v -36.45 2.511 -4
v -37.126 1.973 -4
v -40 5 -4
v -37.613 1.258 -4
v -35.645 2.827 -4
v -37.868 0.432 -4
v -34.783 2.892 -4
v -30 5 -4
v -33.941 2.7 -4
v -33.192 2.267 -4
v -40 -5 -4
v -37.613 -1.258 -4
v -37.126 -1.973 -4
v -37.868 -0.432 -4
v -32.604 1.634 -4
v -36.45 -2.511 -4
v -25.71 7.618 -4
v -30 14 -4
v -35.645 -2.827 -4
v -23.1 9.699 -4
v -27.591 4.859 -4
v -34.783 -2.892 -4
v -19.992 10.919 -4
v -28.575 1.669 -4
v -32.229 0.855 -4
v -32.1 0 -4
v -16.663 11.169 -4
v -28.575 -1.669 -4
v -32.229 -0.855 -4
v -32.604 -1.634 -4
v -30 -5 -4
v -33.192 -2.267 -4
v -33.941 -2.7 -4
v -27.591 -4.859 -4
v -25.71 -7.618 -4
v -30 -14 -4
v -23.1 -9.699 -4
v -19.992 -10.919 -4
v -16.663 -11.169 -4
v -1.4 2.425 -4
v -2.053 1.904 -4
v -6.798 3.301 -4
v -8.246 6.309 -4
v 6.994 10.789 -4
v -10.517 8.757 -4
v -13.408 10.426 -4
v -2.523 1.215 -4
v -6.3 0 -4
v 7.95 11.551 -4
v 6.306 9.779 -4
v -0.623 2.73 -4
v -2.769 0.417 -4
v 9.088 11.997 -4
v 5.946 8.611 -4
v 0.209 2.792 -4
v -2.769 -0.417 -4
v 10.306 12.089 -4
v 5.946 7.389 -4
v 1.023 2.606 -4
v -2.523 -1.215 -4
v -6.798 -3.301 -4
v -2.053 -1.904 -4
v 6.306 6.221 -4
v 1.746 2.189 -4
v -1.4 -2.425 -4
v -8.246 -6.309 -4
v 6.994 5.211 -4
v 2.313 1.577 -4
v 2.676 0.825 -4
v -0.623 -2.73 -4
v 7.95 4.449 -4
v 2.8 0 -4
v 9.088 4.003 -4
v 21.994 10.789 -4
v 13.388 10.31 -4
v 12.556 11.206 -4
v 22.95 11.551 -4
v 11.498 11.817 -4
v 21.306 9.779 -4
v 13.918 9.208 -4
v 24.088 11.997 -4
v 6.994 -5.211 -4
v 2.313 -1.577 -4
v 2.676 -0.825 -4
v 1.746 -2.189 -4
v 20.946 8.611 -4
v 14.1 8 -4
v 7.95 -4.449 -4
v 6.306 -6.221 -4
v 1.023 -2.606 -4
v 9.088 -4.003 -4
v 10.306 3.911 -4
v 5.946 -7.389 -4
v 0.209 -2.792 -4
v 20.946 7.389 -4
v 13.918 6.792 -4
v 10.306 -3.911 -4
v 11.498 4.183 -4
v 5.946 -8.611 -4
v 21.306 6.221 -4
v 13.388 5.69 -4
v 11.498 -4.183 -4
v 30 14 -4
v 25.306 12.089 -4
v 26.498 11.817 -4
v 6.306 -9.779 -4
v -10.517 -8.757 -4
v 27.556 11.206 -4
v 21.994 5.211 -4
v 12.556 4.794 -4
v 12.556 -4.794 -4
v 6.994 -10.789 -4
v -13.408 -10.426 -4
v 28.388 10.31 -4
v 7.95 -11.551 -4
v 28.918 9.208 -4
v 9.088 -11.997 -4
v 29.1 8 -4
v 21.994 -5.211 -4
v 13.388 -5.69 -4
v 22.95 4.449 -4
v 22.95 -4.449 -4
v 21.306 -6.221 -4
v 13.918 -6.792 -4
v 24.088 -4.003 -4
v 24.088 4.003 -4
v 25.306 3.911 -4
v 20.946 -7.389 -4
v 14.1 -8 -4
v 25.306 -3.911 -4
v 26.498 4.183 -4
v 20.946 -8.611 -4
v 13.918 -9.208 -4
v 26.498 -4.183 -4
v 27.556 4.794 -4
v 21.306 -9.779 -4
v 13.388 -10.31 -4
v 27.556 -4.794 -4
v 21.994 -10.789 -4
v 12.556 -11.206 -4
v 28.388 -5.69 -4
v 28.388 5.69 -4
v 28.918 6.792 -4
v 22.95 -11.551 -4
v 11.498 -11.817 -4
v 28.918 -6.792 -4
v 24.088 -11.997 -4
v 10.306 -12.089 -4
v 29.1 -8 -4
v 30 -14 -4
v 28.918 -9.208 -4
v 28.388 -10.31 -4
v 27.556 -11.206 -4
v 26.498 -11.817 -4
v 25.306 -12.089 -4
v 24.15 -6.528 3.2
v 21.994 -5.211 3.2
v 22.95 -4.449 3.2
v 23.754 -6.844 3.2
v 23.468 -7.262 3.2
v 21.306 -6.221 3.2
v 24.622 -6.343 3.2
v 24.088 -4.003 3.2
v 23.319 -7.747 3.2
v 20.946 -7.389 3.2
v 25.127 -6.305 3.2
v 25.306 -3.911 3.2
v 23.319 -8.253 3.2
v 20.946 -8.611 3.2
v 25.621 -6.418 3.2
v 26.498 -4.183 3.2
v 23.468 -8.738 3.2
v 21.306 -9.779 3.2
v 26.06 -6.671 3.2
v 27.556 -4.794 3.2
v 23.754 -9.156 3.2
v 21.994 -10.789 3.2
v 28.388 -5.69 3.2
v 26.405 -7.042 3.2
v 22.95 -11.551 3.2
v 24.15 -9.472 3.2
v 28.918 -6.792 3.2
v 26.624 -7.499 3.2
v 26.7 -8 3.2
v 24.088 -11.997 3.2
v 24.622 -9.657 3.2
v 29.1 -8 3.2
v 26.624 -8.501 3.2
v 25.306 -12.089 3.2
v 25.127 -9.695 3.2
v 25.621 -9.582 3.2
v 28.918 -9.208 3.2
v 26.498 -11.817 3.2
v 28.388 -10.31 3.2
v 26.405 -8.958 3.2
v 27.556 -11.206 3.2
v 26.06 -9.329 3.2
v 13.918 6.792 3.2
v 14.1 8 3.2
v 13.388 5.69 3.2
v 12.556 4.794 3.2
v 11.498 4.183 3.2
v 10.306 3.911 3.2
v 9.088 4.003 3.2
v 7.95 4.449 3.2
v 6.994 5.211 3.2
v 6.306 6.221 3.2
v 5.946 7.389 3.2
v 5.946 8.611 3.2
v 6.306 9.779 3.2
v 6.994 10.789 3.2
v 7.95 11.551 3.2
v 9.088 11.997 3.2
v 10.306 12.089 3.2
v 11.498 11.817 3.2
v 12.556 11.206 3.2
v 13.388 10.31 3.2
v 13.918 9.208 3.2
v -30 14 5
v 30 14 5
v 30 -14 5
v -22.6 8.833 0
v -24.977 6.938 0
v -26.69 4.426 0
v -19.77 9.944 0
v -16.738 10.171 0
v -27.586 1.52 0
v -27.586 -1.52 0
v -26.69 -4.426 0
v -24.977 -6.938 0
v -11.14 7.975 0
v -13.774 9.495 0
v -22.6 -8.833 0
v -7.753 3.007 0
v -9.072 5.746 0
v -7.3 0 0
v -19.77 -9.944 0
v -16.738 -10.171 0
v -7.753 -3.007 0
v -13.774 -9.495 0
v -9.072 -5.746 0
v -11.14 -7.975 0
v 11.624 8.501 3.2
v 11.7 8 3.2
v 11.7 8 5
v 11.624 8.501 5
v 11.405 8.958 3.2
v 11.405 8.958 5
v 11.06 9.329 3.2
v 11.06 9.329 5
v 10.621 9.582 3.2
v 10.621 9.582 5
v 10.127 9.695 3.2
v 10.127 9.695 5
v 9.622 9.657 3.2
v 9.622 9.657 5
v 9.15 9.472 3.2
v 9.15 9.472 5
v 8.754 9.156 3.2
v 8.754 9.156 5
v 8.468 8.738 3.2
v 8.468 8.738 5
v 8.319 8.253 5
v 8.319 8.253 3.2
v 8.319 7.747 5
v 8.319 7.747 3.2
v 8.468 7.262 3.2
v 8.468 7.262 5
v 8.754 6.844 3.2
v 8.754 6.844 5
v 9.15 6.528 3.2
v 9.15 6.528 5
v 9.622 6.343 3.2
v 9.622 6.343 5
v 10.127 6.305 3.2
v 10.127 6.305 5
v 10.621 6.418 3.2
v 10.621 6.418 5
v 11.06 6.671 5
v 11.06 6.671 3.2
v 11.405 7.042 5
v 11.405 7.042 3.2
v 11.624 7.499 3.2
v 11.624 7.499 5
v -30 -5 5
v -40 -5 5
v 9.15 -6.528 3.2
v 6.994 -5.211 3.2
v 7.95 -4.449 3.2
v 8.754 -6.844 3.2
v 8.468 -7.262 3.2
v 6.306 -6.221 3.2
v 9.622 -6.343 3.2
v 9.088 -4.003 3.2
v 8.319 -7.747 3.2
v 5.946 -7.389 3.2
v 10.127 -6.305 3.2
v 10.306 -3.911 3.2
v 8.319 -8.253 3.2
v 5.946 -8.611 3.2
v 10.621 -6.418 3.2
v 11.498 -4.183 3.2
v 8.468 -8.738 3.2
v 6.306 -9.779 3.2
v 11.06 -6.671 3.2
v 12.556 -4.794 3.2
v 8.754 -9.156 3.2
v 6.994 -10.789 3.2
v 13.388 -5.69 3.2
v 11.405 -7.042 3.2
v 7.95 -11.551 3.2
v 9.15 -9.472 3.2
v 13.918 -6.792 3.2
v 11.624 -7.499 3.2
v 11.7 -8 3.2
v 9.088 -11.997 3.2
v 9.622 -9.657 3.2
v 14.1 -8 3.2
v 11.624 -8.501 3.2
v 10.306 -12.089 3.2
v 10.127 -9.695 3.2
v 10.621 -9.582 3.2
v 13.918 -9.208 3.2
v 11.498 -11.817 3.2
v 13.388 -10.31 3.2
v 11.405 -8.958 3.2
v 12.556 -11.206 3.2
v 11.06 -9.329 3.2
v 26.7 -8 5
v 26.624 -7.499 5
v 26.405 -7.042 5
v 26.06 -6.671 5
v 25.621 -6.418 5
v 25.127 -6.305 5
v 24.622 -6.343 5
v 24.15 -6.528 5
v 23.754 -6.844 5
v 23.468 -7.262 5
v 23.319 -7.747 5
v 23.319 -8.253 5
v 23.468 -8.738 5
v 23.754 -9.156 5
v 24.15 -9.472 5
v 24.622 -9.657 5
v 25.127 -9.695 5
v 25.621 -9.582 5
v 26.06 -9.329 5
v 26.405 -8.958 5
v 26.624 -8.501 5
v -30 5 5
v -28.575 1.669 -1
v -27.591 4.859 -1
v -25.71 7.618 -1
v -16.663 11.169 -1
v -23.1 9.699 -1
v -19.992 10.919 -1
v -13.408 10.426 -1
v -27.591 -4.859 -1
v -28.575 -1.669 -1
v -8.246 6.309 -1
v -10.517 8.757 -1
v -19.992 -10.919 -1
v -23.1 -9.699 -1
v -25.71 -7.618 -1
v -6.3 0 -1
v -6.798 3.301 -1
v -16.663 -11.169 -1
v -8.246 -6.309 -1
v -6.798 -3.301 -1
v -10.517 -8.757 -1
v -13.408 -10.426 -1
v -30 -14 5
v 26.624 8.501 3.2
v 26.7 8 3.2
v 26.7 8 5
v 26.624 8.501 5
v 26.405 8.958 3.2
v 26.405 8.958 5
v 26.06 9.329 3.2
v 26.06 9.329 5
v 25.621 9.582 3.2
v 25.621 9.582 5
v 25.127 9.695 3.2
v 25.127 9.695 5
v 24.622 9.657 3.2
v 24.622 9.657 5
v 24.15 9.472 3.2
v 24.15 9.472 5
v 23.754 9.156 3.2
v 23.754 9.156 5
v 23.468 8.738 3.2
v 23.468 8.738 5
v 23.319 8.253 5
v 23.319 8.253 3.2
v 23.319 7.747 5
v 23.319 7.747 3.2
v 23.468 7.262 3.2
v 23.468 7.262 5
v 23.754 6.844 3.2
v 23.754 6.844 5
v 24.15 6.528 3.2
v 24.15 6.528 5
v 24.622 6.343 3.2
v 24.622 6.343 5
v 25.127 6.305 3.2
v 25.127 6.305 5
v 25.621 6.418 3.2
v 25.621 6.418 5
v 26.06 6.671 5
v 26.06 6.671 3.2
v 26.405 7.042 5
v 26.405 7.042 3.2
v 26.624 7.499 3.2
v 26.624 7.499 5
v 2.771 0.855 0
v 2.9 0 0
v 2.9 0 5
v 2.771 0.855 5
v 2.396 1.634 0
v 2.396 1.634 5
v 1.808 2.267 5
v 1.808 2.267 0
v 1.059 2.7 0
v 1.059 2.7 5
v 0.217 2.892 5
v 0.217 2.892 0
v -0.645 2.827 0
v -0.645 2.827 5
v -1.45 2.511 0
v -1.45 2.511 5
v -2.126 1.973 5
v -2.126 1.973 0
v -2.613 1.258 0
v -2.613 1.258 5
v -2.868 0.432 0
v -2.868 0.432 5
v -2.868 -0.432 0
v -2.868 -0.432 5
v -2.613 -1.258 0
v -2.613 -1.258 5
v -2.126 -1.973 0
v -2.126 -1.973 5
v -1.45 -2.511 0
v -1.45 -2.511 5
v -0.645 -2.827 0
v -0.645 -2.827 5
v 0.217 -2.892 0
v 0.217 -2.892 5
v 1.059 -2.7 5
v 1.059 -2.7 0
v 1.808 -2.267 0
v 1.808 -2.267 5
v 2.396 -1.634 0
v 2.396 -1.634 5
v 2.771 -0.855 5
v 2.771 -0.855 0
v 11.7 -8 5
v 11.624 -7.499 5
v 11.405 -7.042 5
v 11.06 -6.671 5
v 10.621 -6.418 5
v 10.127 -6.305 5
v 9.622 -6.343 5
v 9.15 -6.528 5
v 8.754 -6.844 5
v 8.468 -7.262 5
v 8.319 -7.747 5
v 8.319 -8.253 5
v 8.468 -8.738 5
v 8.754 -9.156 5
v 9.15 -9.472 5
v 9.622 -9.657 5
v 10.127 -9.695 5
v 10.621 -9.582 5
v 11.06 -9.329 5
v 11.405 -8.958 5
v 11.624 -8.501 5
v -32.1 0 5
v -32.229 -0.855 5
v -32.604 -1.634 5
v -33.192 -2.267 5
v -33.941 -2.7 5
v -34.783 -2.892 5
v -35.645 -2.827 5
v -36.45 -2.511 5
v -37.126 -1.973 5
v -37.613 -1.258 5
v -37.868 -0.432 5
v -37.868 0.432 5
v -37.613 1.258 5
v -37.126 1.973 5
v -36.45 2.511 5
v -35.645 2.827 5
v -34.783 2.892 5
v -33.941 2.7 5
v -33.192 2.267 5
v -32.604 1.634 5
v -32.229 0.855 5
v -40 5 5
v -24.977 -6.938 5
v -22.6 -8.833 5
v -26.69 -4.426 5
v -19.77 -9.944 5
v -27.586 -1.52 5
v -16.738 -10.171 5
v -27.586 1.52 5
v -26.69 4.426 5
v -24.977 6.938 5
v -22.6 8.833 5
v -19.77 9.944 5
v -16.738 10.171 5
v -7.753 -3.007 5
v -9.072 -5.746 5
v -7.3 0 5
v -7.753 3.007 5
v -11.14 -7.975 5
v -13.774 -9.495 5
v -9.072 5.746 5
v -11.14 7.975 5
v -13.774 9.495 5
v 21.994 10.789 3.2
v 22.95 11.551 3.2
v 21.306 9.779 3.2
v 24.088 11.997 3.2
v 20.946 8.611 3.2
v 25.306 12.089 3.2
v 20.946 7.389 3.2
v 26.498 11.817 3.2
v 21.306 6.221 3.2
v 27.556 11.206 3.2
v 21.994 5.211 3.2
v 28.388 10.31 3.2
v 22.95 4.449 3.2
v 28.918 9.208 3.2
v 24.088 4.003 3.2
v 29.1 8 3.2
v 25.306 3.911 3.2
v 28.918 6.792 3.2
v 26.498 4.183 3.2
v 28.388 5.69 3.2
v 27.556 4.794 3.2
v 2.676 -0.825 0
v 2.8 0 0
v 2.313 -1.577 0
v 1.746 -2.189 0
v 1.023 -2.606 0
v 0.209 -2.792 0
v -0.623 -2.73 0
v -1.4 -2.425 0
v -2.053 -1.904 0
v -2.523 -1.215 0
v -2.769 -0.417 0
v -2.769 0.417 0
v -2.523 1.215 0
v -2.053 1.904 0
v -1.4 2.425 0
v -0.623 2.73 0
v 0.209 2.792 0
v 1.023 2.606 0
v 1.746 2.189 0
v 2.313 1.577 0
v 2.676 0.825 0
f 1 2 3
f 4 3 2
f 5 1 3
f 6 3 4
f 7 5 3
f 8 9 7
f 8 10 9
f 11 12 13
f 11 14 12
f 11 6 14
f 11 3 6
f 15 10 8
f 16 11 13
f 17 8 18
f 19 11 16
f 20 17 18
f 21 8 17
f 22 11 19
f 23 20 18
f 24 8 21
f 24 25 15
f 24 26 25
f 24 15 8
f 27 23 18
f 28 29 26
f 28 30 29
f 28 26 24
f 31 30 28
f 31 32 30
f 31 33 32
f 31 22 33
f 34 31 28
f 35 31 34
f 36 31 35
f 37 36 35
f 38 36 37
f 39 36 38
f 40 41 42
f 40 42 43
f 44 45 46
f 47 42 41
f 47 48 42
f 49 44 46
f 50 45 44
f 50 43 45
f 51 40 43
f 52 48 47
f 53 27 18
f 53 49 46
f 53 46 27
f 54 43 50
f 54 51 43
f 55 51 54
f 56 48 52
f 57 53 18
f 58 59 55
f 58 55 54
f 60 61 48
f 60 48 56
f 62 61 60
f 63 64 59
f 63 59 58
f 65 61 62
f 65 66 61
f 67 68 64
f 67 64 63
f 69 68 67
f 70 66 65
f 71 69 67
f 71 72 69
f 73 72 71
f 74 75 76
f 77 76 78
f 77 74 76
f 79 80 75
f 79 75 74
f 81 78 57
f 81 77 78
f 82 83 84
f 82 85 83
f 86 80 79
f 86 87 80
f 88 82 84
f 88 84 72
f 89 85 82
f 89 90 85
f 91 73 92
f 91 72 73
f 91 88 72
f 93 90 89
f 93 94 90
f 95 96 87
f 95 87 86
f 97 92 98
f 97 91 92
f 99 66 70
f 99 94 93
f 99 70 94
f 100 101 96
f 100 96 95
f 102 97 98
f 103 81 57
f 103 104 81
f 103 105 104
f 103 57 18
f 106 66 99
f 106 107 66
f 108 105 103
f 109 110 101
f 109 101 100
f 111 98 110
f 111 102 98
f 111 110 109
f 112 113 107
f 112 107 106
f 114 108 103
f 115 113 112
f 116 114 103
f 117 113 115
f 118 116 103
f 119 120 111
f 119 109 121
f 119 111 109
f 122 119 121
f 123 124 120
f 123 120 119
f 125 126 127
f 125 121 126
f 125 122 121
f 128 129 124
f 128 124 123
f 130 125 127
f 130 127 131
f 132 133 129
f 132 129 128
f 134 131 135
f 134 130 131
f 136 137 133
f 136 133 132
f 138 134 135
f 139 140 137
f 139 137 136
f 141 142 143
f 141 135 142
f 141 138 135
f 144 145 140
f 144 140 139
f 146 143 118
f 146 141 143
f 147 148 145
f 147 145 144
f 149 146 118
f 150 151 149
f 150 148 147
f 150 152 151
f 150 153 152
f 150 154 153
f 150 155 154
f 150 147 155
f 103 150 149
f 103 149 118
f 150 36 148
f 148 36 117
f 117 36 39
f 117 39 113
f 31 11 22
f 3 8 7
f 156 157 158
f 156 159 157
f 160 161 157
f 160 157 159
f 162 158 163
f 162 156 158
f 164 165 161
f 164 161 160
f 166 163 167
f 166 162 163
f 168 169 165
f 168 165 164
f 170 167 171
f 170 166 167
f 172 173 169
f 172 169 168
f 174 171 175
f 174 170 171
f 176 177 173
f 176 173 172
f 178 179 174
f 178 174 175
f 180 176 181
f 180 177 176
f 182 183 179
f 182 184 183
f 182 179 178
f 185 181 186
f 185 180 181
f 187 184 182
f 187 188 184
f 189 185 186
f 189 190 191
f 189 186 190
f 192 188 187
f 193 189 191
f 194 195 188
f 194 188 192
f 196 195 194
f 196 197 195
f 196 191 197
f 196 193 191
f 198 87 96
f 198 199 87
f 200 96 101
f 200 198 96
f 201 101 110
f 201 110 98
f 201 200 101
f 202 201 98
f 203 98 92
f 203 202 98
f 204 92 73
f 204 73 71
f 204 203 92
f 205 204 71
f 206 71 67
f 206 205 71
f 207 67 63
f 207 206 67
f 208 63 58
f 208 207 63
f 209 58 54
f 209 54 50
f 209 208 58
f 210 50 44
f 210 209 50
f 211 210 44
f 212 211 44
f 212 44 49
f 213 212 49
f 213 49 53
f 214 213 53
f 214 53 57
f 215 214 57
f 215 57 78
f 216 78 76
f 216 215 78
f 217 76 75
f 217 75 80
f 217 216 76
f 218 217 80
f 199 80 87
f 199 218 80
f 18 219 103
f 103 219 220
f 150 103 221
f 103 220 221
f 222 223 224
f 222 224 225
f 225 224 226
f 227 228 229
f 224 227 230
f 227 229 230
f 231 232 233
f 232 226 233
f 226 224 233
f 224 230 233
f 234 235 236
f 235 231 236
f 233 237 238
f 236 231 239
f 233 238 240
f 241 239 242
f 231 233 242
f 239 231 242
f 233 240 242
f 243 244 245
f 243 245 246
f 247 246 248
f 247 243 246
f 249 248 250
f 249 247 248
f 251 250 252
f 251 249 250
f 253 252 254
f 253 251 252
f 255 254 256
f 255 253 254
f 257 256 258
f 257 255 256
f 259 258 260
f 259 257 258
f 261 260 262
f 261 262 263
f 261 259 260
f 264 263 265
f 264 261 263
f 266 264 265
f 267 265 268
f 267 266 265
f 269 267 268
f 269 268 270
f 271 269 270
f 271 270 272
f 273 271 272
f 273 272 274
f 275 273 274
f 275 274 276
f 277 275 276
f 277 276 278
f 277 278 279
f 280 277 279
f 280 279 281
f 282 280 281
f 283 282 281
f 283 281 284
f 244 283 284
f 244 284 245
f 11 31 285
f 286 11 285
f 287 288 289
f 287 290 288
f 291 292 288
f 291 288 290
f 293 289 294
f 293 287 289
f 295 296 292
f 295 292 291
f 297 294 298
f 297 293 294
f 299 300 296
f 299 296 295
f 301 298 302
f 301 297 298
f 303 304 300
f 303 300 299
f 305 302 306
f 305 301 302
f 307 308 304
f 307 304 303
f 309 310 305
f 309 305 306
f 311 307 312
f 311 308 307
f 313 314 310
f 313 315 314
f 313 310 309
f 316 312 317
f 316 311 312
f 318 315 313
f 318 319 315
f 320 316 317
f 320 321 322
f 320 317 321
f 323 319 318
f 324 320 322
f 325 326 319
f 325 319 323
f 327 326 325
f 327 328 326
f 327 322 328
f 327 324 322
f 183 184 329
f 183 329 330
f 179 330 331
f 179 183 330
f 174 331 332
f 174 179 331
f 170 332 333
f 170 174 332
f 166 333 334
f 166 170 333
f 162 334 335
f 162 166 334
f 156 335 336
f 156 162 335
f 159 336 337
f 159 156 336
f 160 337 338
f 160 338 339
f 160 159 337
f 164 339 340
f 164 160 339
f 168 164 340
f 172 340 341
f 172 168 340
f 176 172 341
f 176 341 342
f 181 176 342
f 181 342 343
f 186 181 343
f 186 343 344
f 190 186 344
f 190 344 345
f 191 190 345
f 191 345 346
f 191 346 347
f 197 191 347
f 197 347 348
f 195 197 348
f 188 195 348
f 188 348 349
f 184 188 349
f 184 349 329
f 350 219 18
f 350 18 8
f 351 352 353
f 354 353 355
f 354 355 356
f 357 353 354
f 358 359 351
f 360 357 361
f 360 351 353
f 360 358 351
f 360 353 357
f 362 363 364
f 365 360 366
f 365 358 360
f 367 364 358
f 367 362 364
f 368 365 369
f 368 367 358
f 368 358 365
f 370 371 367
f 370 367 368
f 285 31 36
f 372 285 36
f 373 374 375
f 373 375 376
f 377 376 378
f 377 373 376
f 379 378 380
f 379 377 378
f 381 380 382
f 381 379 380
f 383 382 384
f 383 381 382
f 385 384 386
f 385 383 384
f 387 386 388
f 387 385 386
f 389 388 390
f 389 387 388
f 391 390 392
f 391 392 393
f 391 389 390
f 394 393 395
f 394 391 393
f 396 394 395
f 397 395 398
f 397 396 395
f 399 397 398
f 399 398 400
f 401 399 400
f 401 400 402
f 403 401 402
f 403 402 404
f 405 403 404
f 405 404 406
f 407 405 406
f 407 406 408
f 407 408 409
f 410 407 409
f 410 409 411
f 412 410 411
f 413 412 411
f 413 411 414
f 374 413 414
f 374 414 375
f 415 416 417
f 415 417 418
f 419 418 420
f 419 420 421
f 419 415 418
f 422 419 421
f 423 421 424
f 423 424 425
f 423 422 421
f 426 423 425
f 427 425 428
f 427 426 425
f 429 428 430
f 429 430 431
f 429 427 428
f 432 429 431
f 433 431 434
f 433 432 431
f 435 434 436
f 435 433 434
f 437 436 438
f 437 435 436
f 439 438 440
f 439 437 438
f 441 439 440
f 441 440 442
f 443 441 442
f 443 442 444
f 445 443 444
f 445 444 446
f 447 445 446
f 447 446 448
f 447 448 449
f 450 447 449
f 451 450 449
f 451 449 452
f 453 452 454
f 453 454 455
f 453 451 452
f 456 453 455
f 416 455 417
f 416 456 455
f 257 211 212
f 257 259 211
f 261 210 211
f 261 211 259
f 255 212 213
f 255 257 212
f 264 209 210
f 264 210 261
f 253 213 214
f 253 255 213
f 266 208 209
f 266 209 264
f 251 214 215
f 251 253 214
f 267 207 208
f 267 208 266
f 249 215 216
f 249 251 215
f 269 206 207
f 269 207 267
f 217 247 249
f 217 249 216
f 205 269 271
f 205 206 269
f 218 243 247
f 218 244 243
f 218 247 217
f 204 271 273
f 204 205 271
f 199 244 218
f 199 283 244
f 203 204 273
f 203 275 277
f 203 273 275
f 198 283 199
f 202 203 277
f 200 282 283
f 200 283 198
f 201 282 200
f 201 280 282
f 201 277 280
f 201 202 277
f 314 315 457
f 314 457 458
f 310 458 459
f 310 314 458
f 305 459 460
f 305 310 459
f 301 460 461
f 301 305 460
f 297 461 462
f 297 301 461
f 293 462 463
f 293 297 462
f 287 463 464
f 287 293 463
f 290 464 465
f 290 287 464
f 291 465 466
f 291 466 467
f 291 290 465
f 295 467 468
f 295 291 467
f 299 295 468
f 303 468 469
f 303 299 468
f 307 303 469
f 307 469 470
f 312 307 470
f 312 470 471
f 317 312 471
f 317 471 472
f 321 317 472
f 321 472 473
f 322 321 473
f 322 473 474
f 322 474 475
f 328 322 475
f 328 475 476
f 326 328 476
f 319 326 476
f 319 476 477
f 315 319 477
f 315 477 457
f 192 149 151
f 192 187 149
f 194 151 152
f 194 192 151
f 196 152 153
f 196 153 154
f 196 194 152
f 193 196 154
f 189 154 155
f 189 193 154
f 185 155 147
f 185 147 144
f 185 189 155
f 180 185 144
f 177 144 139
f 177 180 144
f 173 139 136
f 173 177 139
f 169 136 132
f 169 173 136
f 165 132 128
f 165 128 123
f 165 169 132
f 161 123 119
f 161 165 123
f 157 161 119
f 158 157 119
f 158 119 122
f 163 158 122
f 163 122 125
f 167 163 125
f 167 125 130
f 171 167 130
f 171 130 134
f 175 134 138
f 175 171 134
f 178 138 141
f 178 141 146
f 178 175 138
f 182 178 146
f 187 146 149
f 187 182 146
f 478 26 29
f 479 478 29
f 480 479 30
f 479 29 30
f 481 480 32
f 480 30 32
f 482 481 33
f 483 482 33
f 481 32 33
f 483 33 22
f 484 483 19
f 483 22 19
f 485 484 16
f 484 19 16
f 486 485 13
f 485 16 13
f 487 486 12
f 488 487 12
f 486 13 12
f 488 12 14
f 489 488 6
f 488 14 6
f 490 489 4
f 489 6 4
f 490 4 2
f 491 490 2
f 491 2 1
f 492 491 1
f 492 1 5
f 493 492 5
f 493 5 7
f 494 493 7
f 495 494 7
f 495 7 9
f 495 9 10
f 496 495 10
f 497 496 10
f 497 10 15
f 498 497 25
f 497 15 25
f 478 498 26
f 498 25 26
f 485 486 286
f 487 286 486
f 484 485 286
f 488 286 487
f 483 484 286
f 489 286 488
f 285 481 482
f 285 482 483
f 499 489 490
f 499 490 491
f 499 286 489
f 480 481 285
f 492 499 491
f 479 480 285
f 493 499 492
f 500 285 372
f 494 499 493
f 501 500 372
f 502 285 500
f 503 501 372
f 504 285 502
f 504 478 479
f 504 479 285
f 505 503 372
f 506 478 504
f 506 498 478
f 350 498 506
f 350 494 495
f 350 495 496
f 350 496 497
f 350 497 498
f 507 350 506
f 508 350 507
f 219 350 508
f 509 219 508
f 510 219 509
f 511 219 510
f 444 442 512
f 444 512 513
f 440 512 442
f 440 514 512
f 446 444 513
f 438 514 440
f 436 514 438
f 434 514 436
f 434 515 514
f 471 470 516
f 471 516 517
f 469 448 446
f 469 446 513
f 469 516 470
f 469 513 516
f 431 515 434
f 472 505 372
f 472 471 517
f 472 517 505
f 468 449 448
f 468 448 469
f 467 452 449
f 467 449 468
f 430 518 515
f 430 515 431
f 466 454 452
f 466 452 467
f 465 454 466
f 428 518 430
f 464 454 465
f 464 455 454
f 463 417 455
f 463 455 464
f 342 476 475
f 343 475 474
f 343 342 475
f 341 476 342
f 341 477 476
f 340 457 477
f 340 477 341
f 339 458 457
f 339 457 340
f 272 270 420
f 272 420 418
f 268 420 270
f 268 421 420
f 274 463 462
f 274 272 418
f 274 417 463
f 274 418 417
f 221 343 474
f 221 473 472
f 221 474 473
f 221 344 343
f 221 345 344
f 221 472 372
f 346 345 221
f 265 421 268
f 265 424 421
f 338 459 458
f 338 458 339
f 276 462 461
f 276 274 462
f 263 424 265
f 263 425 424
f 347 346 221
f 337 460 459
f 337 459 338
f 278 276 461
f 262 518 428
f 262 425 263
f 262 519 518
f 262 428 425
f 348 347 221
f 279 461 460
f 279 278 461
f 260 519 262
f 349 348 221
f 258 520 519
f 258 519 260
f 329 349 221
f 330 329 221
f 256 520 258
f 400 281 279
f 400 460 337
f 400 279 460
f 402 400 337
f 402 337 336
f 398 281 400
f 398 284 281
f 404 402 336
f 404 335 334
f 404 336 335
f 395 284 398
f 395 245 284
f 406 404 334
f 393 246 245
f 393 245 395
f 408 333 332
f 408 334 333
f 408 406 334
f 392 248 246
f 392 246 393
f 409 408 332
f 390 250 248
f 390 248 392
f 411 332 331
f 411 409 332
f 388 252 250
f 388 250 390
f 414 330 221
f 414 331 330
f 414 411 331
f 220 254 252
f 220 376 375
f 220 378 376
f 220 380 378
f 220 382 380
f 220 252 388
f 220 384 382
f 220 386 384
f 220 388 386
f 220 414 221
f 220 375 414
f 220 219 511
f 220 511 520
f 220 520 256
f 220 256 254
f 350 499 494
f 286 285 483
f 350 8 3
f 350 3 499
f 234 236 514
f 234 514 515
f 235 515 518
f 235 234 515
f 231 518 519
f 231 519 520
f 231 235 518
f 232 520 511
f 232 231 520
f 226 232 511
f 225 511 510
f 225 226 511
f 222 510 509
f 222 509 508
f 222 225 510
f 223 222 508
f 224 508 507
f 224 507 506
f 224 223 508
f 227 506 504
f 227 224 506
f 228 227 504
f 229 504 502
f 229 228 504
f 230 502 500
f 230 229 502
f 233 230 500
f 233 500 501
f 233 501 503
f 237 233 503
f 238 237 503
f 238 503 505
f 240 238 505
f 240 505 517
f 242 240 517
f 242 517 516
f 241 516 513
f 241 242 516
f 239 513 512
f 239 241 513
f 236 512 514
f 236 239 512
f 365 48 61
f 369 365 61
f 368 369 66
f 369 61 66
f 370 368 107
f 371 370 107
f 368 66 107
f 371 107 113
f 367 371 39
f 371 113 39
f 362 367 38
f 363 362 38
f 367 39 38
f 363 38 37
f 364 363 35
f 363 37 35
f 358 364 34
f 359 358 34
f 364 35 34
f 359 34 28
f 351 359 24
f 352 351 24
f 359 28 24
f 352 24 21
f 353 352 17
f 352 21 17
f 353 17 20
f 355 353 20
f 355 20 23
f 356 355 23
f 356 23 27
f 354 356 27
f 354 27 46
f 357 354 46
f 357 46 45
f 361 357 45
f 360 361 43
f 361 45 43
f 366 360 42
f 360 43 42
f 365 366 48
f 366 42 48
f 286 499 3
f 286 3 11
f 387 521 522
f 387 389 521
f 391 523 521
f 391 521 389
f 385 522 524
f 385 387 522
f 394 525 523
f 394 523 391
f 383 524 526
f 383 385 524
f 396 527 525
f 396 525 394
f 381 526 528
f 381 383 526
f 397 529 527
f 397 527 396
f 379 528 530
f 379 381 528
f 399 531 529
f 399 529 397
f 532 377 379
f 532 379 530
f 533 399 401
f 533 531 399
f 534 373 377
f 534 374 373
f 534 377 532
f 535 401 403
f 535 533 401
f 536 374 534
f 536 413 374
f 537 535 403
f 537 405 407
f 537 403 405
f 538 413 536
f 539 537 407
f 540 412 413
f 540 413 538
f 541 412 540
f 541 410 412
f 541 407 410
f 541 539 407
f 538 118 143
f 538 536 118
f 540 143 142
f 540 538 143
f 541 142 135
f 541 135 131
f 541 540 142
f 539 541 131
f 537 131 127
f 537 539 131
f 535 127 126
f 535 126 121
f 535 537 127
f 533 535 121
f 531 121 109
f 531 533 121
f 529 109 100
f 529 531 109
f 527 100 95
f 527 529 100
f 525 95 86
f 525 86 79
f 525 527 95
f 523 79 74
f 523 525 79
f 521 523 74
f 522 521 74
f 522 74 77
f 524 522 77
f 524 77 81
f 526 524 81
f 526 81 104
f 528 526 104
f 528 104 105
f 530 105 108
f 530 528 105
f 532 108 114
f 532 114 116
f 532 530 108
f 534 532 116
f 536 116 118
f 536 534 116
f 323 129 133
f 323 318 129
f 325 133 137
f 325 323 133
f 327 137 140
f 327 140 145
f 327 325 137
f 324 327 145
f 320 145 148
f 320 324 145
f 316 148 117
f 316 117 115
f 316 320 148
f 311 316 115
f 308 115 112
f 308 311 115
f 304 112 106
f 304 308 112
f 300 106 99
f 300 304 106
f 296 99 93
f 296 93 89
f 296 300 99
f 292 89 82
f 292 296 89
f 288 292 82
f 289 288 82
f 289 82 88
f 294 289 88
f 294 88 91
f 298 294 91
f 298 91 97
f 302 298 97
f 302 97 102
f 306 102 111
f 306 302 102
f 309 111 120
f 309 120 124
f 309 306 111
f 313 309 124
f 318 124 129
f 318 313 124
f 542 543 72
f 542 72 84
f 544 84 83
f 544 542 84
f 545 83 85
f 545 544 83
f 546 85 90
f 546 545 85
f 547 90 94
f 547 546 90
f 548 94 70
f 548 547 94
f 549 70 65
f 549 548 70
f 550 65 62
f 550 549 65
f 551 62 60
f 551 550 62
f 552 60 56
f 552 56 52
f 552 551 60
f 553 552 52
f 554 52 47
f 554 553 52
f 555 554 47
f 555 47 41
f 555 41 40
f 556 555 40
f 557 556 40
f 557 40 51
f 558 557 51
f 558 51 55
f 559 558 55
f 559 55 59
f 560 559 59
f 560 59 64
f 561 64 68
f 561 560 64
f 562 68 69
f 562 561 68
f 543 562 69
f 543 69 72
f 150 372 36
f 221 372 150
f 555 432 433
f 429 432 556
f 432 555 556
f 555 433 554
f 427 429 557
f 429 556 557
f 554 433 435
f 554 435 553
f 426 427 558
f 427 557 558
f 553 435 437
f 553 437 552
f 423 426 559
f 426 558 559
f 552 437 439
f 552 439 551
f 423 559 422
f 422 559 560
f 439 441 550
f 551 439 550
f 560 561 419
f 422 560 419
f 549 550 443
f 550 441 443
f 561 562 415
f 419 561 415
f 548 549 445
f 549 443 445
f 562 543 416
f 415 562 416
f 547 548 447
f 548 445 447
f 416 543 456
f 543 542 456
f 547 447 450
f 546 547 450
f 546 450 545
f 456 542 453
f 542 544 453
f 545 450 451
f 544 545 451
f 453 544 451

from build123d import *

# Parameters (mm, degrees)
SKETCH_W        = 60
SKETCH_H        = 28
SKETCH_R        = 1.7
SKETCH_R_2      = 10.2
SKETCH_R_3      = 2.9
PAD_DEPTH       = 5
SKETCH001_R     = 4.1
POCKET001_DEPTH = 3.2
SKETCH002_W     = 60
SKETCH002_H     = 28
SKETCH002_R     = 2.8
SKETCH002_R_2   = 4.1
PAD001_DEPTH    = 4
SKETCH003_R     = 11.2
POCKET_DEPTH    = 3
SKETCH004_W     = 10
SKETCH004_H     = 9
PAD002_DEPTH    = 10
SKETCH009_R     = 2.9
POCKET002_DEPTH = 9


with BuildPart() as part:
    # Sketch → Pad (new body)
    with BuildSketch(Plane.XY):
        Rectangle(SKETCH_W, SKETCH_H)
        with Locations((10, 8)):
            Circle(SKETCH_R, mode=Mode.SUBTRACT)
        with Locations((25, 8)):
            Circle(SKETCH_R, mode=Mode.SUBTRACT)
        with Locations((10, -8)):
            Circle(SKETCH_R, mode=Mode.SUBTRACT)
        with Locations((25, -8)):
            Circle(SKETCH_R, mode=Mode.SUBTRACT)
        with Locations((-17.5, 0)):
            Circle(SKETCH_R_2, mode=Mode.SUBTRACT)
        Circle(SKETCH_R_3, mode=Mode.SUBTRACT)
    extrude(amount=PAD_DEPTH)

    # Sketch001 (on Face11 of Pad) → Pocket001 (cut)
    with BuildSketch(Plane(origin=(0, 0, 0), x_dir=(1, 0, 0), z_dir=(0, 0, -1))):
        with Locations((25, 8)):
            Circle(SKETCH001_R)
        with Locations((25, -8)):
            Circle(SKETCH001_R)
        with Locations((10, 8)):
            Circle(SKETCH001_R)
        with Locations((10, -8)):
            Circle(SKETCH001_R)
    extrude(amount=-POCKET001_DEPTH, mode=Mode.SUBTRACT)

    # Sketch002 (on Face4 of Pocket001) → Pad001 (join)
    with BuildSketch(Plane(origin=(0, 0, 0), x_dir=(1, 0, 0), z_dir=(0, 0, -1))):
        Rectangle(SKETCH002_W, SKETCH002_H)
        Circle(SKETCH002_R, mode=Mode.SUBTRACT)
        with Locations((10, 8)):
            Circle(SKETCH002_R_2, mode=Mode.SUBTRACT)
        with Locations((10, -8)):
            Circle(SKETCH002_R_2, mode=Mode.SUBTRACT)
        with Locations((25, 8)):
            Circle(SKETCH002_R_2, mode=Mode.SUBTRACT)
        with Locations((25, -8)):
            Circle(SKETCH002_R_2, mode=Mode.SUBTRACT)
    extrude(amount=PAD001_DEPTH)

    # Sketch003 (on Face9 of Pad001) → Pocket (cut)
    with BuildSketch(Plane(origin=(0, 0, -4), x_dir=(1, 0, 0), z_dir=(0, 0, -1))):
        with Locations((-17.5, 0)):
            Circle(SKETCH003_R)
    extrude(amount=-POCKET_DEPTH, mode=Mode.SUBTRACT)

    # Sketch004 (on Face7 of Pocket) → Pad002 (join)
    with BuildSketch(Plane(origin=(-30, 0, 0), x_dir=(0, -1, 0), z_dir=(-1, 0, 0))):
        with Locations((0, 0.5)):
            Rectangle(SKETCH004_W, SKETCH004_H)
    extrude(amount=PAD002_DEPTH)

    # Sketch009 → Pocket002 (cut)
    with BuildSketch(Plane(origin=(0, 0, -4), x_dir=(1, 0, 0), z_dir=(0, 0, -1))):
        with Locations((-35, 0)):
            Circle(SKETCH009_R)
    extrude(amount=-POCKET002_DEPTH, mode=Mode.SUBTRACT)


solid = part.part
